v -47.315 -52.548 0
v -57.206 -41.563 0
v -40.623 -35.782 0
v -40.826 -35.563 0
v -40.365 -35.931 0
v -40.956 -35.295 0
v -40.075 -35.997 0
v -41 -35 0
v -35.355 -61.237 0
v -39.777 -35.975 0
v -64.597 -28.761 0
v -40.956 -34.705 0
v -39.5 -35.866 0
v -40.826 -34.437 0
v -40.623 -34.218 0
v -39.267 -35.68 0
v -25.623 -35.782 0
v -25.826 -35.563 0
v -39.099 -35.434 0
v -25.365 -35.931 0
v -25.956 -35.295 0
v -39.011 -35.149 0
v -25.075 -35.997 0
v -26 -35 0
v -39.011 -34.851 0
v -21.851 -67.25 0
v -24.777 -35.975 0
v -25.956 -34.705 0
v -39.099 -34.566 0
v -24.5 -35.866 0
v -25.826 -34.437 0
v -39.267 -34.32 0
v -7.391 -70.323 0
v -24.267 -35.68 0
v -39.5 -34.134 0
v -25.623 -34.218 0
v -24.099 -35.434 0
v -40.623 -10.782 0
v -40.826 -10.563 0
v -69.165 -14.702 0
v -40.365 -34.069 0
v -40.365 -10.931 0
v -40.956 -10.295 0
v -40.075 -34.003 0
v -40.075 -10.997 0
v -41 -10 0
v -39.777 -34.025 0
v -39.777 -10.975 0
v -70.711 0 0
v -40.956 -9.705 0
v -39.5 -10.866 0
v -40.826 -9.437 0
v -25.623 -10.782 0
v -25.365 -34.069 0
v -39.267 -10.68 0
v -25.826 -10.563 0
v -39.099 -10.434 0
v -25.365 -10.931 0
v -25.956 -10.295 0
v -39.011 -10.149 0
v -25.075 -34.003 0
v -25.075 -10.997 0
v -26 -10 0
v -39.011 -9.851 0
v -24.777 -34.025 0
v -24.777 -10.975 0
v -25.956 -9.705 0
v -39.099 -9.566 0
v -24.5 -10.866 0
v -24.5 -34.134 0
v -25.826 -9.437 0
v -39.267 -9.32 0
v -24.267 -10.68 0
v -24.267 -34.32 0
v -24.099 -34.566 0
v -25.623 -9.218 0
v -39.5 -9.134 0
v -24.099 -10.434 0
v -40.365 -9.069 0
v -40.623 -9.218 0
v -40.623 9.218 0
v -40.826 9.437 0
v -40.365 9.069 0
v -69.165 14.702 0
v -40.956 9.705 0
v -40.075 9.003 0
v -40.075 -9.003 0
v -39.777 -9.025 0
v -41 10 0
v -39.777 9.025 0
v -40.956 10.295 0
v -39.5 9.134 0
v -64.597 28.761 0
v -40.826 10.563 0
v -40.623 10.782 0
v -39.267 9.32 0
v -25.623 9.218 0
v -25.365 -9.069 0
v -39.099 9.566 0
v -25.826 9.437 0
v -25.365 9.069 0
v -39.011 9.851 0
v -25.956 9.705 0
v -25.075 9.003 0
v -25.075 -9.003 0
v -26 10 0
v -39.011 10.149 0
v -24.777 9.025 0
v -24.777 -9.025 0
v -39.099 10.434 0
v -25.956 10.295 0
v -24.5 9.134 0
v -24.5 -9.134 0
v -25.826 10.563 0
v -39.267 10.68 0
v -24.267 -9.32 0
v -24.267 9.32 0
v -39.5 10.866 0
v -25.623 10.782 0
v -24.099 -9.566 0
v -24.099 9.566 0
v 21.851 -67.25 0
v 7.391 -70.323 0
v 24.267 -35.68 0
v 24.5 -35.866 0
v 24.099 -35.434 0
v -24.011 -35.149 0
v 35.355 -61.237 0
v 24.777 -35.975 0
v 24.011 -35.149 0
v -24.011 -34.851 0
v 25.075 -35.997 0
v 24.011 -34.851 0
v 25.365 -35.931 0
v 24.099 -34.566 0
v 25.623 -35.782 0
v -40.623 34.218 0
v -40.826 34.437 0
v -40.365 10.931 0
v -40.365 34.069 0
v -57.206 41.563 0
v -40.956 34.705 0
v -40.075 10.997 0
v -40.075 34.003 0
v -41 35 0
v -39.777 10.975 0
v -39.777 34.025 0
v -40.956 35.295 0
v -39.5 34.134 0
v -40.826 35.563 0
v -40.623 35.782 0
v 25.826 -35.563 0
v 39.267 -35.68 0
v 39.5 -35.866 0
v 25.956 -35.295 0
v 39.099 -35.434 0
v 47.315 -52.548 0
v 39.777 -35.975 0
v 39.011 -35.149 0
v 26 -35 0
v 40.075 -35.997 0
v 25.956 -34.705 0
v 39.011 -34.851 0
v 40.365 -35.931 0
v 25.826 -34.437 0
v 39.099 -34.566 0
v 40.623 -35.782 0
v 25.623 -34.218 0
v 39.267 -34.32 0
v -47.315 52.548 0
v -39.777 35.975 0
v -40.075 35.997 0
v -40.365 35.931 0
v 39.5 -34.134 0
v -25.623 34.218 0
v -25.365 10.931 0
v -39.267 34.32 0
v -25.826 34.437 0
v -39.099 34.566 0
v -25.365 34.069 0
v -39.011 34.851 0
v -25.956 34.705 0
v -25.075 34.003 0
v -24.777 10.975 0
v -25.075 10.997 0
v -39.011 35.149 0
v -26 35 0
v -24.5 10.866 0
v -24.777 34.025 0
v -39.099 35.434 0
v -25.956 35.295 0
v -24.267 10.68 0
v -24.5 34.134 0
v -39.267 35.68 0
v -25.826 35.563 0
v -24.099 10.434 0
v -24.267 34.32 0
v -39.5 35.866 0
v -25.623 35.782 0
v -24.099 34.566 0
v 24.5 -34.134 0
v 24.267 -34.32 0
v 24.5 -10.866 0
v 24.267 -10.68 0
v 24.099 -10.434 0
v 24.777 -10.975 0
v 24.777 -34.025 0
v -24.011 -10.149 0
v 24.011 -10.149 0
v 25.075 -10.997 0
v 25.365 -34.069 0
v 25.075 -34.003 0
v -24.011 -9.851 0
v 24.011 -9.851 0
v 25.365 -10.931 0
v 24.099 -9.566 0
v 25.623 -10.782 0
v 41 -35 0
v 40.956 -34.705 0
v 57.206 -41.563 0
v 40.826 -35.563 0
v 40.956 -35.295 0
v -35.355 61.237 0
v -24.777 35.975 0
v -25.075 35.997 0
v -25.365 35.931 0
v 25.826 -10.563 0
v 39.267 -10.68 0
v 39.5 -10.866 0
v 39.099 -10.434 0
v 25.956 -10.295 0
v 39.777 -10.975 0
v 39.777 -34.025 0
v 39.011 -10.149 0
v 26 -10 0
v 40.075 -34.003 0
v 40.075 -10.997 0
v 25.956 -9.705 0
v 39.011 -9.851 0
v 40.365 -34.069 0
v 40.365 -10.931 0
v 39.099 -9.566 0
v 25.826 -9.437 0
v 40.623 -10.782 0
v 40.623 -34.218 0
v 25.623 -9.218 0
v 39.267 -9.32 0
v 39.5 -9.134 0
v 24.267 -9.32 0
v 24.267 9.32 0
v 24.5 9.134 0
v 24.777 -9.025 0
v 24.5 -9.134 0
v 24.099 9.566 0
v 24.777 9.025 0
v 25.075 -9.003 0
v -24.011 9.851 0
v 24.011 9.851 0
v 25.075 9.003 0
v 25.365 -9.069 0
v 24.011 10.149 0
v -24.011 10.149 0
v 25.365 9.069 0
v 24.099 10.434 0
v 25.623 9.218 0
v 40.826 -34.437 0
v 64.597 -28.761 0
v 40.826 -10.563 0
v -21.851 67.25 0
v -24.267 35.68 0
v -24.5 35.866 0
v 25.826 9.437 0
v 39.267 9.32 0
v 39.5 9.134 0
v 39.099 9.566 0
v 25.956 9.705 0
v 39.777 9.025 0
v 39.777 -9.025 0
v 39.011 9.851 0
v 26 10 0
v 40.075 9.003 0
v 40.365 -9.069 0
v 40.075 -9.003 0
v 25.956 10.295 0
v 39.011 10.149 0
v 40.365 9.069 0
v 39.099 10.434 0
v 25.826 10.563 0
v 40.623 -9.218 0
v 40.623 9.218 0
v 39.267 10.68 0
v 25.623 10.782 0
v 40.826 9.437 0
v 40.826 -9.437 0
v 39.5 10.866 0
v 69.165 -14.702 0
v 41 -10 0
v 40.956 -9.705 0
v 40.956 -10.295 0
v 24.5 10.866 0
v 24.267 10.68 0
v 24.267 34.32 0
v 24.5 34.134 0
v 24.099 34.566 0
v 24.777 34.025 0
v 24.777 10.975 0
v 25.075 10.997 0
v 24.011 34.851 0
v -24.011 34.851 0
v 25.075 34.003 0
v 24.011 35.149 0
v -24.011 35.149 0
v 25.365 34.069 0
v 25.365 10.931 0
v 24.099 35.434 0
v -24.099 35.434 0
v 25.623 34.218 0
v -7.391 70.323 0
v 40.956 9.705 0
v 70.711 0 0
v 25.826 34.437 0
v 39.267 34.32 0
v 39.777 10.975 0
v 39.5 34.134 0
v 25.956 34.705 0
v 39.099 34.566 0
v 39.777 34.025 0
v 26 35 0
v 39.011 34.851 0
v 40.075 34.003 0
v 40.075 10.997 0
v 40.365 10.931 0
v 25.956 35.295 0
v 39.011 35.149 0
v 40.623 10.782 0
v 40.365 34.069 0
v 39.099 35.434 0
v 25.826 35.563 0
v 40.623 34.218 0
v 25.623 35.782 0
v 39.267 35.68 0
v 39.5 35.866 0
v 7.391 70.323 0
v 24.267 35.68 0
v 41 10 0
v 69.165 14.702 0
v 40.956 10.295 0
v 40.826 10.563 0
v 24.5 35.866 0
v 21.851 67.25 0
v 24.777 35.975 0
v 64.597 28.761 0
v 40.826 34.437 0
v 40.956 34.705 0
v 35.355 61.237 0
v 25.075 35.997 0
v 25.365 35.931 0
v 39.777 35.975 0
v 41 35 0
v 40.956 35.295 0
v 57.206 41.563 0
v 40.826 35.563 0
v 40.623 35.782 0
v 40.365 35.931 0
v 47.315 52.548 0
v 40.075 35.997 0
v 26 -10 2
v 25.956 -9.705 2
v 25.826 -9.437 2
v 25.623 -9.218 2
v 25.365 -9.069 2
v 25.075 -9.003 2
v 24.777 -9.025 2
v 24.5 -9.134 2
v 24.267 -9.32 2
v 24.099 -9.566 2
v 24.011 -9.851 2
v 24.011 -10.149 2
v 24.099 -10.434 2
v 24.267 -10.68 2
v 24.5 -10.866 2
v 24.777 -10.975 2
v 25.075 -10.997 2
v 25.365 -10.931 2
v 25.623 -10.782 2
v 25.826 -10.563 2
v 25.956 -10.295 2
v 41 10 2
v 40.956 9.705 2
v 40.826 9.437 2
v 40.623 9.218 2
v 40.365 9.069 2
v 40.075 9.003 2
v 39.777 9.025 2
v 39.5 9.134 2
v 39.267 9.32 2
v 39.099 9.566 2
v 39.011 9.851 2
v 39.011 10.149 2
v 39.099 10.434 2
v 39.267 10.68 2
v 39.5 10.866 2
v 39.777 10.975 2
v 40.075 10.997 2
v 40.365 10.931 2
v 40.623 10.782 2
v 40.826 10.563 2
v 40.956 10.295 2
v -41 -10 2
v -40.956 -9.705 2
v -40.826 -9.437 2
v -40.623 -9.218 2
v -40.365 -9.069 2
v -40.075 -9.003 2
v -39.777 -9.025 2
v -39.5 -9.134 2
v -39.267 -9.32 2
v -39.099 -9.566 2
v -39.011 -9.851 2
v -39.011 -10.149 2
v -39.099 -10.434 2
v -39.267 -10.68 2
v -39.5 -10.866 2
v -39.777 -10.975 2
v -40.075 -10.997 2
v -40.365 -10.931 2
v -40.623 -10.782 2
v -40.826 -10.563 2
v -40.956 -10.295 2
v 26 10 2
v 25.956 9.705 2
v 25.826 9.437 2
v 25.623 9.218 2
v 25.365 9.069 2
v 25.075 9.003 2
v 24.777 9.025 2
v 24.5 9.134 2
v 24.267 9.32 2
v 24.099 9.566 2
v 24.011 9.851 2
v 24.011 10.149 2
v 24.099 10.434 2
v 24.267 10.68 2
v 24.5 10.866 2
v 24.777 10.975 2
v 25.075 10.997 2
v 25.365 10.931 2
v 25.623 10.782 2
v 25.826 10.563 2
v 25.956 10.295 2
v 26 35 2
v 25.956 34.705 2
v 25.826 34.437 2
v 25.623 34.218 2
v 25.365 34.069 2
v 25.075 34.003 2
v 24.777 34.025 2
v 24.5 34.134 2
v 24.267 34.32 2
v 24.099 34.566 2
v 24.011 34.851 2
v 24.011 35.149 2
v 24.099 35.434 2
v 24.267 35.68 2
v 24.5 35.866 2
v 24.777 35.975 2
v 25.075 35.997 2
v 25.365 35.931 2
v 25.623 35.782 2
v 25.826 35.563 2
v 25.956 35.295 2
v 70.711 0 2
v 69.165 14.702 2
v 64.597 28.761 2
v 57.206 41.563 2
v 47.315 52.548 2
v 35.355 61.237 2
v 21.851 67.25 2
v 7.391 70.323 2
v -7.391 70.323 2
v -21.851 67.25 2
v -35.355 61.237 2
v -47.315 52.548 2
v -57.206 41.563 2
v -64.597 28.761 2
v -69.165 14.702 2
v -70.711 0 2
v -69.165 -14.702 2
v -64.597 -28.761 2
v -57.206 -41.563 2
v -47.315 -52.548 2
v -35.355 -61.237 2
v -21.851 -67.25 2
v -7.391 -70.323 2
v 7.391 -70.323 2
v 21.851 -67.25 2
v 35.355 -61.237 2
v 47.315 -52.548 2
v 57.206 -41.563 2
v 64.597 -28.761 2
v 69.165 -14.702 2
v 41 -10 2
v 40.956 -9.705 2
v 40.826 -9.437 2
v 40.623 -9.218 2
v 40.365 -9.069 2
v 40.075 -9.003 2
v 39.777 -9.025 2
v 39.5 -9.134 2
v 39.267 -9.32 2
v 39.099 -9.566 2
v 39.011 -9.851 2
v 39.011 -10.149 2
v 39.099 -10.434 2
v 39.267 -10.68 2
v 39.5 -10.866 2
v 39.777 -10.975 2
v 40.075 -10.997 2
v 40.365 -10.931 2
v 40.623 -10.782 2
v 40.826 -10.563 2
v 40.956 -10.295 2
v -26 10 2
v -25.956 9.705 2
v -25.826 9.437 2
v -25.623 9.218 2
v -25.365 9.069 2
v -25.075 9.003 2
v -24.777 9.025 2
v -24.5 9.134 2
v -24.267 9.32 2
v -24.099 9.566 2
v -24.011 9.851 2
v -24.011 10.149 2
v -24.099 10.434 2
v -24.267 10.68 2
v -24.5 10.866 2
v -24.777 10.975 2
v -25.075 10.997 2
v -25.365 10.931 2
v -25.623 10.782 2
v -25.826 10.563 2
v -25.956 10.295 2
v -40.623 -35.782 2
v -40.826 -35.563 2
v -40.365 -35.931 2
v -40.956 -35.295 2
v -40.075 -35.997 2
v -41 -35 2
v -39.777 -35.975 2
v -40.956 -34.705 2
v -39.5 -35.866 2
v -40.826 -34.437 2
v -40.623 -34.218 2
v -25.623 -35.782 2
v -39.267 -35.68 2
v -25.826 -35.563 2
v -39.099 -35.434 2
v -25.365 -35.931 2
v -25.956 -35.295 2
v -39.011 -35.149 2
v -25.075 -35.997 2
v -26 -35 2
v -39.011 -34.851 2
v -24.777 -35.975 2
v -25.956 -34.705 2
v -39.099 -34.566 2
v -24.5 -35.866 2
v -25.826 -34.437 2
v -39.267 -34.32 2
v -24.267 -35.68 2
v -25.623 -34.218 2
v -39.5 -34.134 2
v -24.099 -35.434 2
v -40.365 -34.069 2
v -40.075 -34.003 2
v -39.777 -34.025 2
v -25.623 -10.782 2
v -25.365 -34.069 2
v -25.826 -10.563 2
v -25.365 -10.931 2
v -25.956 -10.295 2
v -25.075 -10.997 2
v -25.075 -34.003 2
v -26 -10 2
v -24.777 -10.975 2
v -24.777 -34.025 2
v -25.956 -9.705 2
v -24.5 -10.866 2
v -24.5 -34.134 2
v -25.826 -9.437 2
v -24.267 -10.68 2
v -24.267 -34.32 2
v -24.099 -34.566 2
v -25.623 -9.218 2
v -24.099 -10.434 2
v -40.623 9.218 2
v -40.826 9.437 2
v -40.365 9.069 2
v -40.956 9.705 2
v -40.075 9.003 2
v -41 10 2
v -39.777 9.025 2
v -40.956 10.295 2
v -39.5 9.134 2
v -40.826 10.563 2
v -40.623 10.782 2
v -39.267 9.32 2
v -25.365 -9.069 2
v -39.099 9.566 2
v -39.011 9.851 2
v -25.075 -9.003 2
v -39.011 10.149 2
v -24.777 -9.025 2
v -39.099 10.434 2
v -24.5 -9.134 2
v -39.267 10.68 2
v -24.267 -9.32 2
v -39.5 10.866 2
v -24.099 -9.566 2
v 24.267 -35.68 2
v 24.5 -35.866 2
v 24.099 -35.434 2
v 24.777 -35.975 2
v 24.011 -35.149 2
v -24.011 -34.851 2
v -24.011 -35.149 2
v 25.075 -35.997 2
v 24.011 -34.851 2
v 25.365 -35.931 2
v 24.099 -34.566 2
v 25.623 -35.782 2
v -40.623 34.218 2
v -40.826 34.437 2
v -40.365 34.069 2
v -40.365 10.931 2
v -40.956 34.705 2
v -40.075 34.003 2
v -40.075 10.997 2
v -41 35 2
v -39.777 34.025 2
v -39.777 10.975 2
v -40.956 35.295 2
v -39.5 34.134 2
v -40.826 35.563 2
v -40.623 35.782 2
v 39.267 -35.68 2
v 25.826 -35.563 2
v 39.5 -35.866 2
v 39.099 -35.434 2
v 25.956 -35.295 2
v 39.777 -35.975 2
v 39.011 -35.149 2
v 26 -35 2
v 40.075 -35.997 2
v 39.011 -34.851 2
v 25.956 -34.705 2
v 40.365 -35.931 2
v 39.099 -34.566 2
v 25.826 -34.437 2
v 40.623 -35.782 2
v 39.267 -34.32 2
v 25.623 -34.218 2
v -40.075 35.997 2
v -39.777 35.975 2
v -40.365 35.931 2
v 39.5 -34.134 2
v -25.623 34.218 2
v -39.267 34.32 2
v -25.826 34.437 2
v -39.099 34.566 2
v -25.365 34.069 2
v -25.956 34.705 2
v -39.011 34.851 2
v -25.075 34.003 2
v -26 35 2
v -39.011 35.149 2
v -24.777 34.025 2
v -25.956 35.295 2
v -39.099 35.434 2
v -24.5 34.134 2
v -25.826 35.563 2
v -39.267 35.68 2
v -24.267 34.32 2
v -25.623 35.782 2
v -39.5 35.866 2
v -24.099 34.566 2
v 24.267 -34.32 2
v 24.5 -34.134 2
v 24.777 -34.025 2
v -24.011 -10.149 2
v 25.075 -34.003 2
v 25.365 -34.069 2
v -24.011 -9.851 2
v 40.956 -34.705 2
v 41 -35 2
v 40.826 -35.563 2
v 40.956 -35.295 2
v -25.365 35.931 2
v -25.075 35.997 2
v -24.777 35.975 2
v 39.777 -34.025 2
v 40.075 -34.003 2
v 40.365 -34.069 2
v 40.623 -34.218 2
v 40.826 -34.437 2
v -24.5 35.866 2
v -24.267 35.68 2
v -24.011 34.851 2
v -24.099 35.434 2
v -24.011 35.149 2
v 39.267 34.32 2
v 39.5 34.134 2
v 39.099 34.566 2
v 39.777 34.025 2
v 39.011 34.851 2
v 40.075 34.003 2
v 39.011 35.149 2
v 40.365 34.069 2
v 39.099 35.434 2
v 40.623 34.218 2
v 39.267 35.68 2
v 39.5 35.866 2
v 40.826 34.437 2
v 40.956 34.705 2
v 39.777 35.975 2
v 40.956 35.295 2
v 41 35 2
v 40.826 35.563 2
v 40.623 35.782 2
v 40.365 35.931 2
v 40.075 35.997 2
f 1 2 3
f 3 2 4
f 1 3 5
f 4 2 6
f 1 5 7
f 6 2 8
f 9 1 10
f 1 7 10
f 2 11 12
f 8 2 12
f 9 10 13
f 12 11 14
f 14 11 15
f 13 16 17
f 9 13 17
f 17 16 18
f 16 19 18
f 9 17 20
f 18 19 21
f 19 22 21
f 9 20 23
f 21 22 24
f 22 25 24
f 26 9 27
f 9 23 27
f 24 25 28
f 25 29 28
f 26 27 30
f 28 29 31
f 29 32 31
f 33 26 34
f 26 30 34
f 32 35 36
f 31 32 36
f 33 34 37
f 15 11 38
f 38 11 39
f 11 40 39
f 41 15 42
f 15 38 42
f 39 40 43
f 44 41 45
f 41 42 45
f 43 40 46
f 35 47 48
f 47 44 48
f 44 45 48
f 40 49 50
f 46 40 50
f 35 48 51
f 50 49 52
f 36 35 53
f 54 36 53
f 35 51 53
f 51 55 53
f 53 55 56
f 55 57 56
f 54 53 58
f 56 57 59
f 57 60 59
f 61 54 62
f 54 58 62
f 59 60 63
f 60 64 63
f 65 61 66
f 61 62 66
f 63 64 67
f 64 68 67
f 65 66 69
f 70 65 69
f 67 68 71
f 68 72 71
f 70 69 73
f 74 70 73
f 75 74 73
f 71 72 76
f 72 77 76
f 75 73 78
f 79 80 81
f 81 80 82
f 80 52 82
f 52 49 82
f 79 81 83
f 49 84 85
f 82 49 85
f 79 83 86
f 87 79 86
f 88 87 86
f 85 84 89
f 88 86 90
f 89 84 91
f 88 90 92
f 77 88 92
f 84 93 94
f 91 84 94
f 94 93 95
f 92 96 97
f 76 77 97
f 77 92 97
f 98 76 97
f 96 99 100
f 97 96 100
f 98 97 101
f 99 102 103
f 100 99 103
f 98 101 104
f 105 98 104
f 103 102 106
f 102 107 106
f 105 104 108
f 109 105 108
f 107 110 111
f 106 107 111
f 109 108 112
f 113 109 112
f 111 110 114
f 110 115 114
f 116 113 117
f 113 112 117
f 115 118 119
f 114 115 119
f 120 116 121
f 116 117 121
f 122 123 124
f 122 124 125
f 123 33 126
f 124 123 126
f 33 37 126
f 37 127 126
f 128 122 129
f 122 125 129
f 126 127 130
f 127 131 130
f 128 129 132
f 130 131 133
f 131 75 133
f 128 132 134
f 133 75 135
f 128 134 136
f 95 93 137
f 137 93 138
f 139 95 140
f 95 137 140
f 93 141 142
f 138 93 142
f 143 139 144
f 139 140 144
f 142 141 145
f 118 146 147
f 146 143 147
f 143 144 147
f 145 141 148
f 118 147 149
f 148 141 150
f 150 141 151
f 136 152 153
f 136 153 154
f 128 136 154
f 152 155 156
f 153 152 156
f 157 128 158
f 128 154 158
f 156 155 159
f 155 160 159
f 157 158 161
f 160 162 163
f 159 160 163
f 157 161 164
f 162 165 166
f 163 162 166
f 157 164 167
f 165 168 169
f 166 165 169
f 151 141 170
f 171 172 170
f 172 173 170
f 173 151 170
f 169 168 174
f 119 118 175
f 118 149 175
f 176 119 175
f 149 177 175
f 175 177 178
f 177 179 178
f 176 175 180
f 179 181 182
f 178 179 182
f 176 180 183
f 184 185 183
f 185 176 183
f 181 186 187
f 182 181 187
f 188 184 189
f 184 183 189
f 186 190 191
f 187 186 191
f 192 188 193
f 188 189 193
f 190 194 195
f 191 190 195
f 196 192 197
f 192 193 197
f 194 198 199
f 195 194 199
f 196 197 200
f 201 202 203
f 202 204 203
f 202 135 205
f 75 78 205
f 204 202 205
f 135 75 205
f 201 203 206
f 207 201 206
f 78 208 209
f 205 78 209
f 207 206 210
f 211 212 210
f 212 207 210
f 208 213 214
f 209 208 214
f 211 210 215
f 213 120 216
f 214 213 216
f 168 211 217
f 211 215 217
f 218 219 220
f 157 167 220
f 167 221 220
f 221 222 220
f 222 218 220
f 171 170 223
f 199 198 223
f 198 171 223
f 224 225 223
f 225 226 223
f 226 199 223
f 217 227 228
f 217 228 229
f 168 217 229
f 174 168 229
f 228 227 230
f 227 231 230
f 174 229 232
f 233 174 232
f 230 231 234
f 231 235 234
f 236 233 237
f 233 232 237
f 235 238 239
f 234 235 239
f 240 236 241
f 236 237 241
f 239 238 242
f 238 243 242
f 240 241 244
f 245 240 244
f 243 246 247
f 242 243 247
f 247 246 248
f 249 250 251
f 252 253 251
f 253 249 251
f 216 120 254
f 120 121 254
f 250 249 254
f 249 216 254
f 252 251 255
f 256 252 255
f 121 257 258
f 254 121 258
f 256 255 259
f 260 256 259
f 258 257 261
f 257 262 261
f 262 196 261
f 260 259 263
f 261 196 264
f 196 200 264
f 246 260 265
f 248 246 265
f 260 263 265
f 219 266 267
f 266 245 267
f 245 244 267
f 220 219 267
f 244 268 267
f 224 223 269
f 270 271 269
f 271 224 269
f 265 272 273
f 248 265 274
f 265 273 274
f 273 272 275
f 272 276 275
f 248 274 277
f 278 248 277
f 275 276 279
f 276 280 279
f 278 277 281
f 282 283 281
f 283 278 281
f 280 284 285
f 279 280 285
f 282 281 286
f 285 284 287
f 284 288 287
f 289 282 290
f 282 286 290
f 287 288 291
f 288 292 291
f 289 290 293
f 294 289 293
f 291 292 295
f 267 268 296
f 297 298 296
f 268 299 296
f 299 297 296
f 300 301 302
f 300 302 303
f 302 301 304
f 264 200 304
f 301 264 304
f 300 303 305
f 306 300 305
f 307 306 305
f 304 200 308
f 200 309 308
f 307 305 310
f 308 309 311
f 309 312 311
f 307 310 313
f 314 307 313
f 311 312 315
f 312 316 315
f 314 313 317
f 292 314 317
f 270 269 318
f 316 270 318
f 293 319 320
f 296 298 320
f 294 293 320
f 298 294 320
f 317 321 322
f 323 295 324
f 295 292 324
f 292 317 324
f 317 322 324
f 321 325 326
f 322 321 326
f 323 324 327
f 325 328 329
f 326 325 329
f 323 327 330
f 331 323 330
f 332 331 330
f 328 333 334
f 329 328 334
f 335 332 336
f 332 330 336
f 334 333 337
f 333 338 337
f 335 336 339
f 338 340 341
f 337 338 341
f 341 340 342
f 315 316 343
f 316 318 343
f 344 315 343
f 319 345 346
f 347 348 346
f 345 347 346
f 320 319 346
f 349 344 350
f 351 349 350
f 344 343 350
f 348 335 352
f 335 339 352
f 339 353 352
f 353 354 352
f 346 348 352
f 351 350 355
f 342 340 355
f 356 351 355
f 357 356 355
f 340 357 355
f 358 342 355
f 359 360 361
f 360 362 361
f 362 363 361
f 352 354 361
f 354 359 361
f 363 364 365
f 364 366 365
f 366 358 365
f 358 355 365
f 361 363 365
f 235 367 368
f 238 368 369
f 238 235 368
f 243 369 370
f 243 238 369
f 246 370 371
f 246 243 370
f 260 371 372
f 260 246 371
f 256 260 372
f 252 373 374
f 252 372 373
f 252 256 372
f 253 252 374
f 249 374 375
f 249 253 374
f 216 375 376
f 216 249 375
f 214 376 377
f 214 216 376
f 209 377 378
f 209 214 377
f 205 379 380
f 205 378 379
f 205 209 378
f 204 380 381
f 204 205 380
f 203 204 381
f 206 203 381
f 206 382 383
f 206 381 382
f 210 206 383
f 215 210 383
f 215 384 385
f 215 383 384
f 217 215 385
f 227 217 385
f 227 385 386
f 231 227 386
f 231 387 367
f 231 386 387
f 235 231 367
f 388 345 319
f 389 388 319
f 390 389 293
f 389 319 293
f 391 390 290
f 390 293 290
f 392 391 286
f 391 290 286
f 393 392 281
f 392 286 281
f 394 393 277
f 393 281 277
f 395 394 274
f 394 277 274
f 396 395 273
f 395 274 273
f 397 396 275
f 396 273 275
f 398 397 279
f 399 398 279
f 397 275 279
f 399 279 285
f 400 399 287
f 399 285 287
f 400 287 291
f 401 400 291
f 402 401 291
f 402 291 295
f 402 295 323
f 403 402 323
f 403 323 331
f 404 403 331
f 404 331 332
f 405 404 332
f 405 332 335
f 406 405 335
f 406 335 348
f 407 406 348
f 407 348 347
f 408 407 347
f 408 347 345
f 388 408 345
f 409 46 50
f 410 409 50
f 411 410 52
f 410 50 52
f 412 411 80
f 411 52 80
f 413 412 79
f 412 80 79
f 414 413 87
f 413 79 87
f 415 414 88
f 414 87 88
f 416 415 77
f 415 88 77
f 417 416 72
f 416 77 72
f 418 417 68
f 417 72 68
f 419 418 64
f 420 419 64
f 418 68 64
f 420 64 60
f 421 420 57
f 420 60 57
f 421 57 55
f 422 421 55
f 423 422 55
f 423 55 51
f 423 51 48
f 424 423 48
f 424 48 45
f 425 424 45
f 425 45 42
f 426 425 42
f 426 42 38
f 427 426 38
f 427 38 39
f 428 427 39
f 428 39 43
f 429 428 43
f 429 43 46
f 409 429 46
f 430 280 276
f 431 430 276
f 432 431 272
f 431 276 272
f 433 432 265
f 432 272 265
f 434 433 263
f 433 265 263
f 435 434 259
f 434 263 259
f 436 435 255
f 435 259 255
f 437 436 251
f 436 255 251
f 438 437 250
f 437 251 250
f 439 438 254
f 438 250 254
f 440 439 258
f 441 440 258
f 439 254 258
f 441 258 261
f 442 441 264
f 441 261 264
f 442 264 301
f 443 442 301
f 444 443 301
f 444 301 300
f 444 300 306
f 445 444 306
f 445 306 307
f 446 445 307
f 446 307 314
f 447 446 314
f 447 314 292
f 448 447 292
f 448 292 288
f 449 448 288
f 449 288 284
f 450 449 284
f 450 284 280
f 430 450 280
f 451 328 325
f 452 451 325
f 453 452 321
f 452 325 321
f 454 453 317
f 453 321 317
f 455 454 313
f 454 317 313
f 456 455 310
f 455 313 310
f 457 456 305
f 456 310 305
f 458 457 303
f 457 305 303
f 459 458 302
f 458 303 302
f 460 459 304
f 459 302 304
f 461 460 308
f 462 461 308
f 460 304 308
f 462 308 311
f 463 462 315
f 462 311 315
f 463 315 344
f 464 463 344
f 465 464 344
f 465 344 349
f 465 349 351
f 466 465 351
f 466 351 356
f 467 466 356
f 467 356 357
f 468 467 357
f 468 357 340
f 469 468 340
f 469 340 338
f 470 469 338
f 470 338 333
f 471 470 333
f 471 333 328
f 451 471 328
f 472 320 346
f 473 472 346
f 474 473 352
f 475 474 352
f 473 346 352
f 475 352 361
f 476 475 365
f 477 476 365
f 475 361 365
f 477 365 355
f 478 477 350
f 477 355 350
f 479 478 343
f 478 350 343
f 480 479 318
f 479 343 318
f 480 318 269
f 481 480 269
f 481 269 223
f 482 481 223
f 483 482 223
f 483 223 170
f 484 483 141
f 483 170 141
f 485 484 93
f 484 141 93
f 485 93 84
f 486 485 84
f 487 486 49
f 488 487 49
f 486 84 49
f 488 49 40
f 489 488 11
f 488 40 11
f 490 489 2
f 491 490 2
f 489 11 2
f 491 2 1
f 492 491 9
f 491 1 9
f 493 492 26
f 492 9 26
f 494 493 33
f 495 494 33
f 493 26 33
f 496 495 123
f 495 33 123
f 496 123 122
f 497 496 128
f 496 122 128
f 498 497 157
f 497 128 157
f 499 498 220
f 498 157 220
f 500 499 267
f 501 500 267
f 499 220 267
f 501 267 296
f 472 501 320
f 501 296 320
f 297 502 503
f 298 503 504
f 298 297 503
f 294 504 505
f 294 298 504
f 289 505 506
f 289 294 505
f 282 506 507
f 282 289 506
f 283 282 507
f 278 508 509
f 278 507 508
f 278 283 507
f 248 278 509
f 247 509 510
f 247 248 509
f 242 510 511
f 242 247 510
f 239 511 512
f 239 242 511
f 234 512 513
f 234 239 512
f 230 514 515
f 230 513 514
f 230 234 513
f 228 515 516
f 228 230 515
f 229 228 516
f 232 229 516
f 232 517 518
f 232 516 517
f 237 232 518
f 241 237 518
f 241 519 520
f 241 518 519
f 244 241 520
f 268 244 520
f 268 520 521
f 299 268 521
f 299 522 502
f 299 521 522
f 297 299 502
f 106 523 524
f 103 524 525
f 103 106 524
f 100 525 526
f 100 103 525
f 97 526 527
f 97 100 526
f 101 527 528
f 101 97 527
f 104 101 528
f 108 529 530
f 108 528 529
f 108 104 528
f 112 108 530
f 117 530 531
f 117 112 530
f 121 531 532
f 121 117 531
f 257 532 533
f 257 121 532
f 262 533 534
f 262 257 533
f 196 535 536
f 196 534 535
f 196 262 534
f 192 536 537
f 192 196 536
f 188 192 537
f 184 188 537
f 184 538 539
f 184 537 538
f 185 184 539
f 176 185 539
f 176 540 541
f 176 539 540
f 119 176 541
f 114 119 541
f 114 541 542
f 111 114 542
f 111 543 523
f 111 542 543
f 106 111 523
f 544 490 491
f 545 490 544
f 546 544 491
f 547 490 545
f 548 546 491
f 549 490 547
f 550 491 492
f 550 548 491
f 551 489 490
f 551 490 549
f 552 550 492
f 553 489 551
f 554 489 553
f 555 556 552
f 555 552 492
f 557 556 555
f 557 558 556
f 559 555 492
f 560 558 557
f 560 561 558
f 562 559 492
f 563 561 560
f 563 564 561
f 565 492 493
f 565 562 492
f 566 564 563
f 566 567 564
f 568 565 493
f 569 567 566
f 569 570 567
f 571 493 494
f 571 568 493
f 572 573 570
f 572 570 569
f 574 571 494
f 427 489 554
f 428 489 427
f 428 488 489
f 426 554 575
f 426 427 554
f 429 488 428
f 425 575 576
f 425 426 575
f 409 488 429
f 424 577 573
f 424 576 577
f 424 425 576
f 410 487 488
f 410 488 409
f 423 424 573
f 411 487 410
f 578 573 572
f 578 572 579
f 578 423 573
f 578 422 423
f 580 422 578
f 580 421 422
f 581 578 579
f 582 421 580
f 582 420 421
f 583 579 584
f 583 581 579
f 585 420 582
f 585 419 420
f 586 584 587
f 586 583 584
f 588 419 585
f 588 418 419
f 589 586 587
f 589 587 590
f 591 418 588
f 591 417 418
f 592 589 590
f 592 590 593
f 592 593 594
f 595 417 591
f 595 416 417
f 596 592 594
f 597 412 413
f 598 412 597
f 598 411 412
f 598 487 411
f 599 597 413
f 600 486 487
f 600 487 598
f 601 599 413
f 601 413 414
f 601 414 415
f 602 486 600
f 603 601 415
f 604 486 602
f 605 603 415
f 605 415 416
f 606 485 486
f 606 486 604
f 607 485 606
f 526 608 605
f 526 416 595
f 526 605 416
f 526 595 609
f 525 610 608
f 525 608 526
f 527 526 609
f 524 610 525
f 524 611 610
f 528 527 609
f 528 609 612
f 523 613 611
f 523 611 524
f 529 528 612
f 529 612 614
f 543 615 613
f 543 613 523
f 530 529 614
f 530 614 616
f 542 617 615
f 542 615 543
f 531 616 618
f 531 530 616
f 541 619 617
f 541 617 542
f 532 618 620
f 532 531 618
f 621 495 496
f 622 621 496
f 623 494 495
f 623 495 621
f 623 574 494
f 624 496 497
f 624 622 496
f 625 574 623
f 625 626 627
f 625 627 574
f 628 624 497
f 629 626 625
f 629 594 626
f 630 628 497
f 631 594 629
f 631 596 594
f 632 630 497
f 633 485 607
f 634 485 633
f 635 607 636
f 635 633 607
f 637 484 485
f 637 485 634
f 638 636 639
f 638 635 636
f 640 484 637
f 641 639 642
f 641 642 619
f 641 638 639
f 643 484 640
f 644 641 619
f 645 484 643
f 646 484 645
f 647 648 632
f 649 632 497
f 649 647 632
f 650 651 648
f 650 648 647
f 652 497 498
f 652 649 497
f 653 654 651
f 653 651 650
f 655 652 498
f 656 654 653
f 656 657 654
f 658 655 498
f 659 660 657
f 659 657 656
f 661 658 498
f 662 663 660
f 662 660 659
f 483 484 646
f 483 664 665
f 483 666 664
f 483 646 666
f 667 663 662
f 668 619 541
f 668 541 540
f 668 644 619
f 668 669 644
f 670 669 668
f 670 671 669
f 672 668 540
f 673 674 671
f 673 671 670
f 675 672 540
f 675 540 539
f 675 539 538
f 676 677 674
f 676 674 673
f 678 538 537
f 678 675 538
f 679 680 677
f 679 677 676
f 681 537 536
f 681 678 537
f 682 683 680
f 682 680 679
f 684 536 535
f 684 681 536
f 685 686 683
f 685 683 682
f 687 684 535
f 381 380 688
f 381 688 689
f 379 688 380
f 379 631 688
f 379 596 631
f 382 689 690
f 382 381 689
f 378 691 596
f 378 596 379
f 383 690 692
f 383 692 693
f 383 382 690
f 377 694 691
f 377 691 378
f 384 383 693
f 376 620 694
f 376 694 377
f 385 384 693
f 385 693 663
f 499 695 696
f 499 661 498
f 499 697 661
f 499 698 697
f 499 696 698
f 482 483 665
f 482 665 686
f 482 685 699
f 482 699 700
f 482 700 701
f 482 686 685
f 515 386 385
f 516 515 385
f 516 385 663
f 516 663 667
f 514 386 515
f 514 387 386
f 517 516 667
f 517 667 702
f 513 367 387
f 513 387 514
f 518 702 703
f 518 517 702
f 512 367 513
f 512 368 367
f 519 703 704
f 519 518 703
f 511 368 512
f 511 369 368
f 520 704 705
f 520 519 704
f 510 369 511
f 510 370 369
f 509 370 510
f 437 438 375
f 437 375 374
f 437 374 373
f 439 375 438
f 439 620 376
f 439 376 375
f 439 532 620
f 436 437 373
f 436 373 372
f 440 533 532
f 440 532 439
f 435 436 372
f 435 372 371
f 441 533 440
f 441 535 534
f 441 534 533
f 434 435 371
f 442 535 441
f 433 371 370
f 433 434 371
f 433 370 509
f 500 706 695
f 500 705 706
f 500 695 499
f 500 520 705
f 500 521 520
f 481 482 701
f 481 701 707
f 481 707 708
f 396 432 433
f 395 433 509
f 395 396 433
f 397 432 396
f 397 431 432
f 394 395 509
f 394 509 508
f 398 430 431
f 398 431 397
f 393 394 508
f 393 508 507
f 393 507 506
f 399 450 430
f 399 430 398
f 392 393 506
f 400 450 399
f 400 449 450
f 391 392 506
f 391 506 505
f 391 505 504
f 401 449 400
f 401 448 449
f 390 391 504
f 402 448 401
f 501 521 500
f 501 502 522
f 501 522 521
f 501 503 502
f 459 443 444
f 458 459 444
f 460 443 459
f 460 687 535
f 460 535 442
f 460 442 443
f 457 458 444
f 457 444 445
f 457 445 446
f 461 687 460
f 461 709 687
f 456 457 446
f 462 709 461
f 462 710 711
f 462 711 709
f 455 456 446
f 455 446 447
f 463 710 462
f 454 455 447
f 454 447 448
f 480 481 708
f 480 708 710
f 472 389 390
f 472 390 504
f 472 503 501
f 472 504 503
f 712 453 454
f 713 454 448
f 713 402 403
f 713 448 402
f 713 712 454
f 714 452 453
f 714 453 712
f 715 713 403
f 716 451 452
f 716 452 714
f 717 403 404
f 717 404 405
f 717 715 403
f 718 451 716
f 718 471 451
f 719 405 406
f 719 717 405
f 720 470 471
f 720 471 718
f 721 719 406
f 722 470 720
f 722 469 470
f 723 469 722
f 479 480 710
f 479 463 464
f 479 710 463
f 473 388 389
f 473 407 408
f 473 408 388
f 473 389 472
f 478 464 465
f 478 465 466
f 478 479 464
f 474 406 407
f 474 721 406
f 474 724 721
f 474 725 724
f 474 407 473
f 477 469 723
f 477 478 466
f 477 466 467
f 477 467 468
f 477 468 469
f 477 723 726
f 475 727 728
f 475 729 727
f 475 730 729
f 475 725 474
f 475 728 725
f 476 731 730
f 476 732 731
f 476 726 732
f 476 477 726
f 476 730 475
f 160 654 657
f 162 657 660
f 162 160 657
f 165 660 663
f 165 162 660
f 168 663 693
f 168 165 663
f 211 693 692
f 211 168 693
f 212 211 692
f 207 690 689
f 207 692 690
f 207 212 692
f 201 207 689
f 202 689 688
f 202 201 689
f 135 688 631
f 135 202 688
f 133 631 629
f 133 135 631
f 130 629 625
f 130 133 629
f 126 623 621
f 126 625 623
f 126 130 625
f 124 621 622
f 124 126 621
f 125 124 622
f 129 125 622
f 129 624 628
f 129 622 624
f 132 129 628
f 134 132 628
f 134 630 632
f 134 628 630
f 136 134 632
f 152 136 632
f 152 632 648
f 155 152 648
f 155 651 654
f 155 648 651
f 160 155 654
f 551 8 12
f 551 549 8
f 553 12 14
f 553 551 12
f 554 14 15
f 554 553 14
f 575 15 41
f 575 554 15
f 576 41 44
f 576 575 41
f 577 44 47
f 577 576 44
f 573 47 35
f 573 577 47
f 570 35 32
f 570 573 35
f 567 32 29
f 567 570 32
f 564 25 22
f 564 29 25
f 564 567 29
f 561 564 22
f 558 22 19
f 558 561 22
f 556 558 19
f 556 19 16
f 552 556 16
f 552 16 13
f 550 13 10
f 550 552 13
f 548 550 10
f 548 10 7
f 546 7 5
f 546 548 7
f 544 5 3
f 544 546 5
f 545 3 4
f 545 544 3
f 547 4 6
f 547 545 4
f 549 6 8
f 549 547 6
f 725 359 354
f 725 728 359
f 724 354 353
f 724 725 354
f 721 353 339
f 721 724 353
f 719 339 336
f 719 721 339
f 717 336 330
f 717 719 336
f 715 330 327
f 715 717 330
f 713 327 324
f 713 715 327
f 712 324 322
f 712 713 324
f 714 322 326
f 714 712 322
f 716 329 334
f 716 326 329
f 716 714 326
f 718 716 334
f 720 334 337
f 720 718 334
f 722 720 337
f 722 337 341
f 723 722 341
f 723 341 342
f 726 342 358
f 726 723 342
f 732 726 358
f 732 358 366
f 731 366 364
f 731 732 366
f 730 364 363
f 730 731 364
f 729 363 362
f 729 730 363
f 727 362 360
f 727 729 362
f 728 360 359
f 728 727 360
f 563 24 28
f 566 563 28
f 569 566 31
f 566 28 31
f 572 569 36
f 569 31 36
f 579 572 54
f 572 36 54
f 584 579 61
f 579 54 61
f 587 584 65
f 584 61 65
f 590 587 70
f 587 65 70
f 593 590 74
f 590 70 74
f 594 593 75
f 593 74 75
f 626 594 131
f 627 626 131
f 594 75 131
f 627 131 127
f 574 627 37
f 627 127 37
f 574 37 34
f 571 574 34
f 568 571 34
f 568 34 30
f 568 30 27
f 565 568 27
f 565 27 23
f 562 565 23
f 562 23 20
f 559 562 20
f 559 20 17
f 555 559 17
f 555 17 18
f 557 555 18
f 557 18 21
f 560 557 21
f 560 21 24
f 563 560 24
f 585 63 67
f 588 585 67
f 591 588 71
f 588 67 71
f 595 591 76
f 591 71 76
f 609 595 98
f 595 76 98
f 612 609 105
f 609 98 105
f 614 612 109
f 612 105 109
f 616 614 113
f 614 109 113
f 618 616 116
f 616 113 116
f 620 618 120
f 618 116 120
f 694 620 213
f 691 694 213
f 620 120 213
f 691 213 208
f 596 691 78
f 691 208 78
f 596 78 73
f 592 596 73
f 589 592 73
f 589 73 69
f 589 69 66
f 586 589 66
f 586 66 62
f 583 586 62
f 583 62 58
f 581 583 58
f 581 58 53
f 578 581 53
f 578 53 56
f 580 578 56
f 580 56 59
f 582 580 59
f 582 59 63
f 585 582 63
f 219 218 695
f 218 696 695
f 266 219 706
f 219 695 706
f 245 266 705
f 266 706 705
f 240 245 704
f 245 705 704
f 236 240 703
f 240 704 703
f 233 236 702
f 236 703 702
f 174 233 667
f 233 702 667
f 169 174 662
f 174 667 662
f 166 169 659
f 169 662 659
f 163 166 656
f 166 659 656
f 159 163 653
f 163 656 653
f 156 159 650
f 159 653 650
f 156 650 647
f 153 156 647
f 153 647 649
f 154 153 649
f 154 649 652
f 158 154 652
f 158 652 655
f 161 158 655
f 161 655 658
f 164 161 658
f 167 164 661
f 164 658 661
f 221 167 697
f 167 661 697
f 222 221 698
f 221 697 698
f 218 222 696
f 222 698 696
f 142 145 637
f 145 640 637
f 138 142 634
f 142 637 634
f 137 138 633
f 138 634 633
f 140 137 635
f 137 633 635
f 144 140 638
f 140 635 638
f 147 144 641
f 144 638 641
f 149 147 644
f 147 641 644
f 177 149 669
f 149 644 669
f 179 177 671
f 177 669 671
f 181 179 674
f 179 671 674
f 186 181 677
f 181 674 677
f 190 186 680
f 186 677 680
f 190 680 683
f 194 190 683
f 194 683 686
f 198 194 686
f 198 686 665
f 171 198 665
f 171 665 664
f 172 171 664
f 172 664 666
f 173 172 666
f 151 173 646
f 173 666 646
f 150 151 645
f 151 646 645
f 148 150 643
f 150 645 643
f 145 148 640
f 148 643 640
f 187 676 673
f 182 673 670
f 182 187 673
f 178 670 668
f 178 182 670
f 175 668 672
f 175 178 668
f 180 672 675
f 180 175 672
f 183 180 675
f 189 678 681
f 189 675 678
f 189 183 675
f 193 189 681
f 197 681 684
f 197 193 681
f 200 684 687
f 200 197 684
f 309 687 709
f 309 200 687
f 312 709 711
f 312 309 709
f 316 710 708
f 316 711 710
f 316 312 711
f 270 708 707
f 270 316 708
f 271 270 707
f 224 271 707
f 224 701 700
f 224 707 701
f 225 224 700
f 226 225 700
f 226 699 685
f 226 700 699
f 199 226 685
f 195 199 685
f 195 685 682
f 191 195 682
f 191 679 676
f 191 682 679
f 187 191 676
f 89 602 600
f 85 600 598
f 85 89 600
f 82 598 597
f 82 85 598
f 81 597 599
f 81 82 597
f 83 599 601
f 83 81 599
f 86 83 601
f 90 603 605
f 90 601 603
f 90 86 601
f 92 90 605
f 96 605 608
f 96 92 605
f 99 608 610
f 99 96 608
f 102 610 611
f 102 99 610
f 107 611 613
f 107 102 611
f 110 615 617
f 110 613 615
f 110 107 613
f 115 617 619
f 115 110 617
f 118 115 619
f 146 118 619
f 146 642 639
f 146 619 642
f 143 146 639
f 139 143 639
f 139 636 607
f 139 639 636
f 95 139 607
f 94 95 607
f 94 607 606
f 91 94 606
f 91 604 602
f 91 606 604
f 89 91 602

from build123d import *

# Parameters (mm, degrees)
SKETCH_1_R               = 70.710678119
EXTRUDE_1_DEPTH          = 2
SKETCH_2_R               = 1
CUT_EXTRUDE_4_DEPTH      = 101.019998
MIRROR_6_COPY_1_SKETCH_R = 1
MIRROR_6_COPY_1_DEPTH    = 101.019998


with BuildPart() as part:
    # ｽｹｯﾁ1 → ﾎﾞｽ - 押し出し1 (new body)
    with BuildSketch(Plane.XY):
        Circle(SKETCH_1_R)
    extrude(amount=EXTRUDE_1_DEPTH)

    # ｽｹｯﾁ2 → ｶｯﾄ - 押し出し4 (cut, symmetric)
    with BuildSketch(Plane.XY):
        with Locations((25, -10)):
            Circle(SKETCH_2_R)
        with Locations((40, -10)):
            Circle(SKETCH_2_R)
        with Locations((25, -35)):
            Circle(SKETCH_2_R)
        with Locations((40, -35)):
            Circle(SKETCH_2_R)
    cut_extrude_4 = extrude(amount=CUT_EXTRUDE_4_DEPTH, both=True, mode=Mode.SUBTRACT)

    # ﾐﾗｰ2: ｶｯﾄ - 押し出し4 across plane
    add(cut_extrude_4.mirror(Plane(origin=(0, 0, 0), x_dir=(0, 0, 1), z_dir=(1, 0, 0))), mode=Mode.SUBTRACT)

    # ﾐﾗｰ6: ｶｯﾄ - 押し出し4 across plane
    add(cut_extrude_4.mirror(Plane.ZX), mode=Mode.SUBTRACT)

    # ﾐﾗｰ6 copy 1 sketch → ﾐﾗｰ6 copy 1 (cut, symmetric)
    with BuildSketch(Plane(origin=(0, 0, 0), x_dir=(-1, 0, 0), z_dir=(0, 0, 1))):
        with Locations((25, -10)):
            Circle(MIRROR_6_COPY_1_SKETCH_R)
        with Locations((40, -10)):
            Circle(MIRROR_6_COPY_1_SKETCH_R)
        with Locations((25, -35)):
            Circle(MIRROR_6_COPY_1_SKETCH_R)
        with Locations((40, -35)):
            Circle(MIRROR_6_COPY_1_SKETCH_R)
    extrude(amount=MIRROR_6_COPY_1_DEPTH, both=True, mode=Mode.SUBTRACT)


solid = part.part
